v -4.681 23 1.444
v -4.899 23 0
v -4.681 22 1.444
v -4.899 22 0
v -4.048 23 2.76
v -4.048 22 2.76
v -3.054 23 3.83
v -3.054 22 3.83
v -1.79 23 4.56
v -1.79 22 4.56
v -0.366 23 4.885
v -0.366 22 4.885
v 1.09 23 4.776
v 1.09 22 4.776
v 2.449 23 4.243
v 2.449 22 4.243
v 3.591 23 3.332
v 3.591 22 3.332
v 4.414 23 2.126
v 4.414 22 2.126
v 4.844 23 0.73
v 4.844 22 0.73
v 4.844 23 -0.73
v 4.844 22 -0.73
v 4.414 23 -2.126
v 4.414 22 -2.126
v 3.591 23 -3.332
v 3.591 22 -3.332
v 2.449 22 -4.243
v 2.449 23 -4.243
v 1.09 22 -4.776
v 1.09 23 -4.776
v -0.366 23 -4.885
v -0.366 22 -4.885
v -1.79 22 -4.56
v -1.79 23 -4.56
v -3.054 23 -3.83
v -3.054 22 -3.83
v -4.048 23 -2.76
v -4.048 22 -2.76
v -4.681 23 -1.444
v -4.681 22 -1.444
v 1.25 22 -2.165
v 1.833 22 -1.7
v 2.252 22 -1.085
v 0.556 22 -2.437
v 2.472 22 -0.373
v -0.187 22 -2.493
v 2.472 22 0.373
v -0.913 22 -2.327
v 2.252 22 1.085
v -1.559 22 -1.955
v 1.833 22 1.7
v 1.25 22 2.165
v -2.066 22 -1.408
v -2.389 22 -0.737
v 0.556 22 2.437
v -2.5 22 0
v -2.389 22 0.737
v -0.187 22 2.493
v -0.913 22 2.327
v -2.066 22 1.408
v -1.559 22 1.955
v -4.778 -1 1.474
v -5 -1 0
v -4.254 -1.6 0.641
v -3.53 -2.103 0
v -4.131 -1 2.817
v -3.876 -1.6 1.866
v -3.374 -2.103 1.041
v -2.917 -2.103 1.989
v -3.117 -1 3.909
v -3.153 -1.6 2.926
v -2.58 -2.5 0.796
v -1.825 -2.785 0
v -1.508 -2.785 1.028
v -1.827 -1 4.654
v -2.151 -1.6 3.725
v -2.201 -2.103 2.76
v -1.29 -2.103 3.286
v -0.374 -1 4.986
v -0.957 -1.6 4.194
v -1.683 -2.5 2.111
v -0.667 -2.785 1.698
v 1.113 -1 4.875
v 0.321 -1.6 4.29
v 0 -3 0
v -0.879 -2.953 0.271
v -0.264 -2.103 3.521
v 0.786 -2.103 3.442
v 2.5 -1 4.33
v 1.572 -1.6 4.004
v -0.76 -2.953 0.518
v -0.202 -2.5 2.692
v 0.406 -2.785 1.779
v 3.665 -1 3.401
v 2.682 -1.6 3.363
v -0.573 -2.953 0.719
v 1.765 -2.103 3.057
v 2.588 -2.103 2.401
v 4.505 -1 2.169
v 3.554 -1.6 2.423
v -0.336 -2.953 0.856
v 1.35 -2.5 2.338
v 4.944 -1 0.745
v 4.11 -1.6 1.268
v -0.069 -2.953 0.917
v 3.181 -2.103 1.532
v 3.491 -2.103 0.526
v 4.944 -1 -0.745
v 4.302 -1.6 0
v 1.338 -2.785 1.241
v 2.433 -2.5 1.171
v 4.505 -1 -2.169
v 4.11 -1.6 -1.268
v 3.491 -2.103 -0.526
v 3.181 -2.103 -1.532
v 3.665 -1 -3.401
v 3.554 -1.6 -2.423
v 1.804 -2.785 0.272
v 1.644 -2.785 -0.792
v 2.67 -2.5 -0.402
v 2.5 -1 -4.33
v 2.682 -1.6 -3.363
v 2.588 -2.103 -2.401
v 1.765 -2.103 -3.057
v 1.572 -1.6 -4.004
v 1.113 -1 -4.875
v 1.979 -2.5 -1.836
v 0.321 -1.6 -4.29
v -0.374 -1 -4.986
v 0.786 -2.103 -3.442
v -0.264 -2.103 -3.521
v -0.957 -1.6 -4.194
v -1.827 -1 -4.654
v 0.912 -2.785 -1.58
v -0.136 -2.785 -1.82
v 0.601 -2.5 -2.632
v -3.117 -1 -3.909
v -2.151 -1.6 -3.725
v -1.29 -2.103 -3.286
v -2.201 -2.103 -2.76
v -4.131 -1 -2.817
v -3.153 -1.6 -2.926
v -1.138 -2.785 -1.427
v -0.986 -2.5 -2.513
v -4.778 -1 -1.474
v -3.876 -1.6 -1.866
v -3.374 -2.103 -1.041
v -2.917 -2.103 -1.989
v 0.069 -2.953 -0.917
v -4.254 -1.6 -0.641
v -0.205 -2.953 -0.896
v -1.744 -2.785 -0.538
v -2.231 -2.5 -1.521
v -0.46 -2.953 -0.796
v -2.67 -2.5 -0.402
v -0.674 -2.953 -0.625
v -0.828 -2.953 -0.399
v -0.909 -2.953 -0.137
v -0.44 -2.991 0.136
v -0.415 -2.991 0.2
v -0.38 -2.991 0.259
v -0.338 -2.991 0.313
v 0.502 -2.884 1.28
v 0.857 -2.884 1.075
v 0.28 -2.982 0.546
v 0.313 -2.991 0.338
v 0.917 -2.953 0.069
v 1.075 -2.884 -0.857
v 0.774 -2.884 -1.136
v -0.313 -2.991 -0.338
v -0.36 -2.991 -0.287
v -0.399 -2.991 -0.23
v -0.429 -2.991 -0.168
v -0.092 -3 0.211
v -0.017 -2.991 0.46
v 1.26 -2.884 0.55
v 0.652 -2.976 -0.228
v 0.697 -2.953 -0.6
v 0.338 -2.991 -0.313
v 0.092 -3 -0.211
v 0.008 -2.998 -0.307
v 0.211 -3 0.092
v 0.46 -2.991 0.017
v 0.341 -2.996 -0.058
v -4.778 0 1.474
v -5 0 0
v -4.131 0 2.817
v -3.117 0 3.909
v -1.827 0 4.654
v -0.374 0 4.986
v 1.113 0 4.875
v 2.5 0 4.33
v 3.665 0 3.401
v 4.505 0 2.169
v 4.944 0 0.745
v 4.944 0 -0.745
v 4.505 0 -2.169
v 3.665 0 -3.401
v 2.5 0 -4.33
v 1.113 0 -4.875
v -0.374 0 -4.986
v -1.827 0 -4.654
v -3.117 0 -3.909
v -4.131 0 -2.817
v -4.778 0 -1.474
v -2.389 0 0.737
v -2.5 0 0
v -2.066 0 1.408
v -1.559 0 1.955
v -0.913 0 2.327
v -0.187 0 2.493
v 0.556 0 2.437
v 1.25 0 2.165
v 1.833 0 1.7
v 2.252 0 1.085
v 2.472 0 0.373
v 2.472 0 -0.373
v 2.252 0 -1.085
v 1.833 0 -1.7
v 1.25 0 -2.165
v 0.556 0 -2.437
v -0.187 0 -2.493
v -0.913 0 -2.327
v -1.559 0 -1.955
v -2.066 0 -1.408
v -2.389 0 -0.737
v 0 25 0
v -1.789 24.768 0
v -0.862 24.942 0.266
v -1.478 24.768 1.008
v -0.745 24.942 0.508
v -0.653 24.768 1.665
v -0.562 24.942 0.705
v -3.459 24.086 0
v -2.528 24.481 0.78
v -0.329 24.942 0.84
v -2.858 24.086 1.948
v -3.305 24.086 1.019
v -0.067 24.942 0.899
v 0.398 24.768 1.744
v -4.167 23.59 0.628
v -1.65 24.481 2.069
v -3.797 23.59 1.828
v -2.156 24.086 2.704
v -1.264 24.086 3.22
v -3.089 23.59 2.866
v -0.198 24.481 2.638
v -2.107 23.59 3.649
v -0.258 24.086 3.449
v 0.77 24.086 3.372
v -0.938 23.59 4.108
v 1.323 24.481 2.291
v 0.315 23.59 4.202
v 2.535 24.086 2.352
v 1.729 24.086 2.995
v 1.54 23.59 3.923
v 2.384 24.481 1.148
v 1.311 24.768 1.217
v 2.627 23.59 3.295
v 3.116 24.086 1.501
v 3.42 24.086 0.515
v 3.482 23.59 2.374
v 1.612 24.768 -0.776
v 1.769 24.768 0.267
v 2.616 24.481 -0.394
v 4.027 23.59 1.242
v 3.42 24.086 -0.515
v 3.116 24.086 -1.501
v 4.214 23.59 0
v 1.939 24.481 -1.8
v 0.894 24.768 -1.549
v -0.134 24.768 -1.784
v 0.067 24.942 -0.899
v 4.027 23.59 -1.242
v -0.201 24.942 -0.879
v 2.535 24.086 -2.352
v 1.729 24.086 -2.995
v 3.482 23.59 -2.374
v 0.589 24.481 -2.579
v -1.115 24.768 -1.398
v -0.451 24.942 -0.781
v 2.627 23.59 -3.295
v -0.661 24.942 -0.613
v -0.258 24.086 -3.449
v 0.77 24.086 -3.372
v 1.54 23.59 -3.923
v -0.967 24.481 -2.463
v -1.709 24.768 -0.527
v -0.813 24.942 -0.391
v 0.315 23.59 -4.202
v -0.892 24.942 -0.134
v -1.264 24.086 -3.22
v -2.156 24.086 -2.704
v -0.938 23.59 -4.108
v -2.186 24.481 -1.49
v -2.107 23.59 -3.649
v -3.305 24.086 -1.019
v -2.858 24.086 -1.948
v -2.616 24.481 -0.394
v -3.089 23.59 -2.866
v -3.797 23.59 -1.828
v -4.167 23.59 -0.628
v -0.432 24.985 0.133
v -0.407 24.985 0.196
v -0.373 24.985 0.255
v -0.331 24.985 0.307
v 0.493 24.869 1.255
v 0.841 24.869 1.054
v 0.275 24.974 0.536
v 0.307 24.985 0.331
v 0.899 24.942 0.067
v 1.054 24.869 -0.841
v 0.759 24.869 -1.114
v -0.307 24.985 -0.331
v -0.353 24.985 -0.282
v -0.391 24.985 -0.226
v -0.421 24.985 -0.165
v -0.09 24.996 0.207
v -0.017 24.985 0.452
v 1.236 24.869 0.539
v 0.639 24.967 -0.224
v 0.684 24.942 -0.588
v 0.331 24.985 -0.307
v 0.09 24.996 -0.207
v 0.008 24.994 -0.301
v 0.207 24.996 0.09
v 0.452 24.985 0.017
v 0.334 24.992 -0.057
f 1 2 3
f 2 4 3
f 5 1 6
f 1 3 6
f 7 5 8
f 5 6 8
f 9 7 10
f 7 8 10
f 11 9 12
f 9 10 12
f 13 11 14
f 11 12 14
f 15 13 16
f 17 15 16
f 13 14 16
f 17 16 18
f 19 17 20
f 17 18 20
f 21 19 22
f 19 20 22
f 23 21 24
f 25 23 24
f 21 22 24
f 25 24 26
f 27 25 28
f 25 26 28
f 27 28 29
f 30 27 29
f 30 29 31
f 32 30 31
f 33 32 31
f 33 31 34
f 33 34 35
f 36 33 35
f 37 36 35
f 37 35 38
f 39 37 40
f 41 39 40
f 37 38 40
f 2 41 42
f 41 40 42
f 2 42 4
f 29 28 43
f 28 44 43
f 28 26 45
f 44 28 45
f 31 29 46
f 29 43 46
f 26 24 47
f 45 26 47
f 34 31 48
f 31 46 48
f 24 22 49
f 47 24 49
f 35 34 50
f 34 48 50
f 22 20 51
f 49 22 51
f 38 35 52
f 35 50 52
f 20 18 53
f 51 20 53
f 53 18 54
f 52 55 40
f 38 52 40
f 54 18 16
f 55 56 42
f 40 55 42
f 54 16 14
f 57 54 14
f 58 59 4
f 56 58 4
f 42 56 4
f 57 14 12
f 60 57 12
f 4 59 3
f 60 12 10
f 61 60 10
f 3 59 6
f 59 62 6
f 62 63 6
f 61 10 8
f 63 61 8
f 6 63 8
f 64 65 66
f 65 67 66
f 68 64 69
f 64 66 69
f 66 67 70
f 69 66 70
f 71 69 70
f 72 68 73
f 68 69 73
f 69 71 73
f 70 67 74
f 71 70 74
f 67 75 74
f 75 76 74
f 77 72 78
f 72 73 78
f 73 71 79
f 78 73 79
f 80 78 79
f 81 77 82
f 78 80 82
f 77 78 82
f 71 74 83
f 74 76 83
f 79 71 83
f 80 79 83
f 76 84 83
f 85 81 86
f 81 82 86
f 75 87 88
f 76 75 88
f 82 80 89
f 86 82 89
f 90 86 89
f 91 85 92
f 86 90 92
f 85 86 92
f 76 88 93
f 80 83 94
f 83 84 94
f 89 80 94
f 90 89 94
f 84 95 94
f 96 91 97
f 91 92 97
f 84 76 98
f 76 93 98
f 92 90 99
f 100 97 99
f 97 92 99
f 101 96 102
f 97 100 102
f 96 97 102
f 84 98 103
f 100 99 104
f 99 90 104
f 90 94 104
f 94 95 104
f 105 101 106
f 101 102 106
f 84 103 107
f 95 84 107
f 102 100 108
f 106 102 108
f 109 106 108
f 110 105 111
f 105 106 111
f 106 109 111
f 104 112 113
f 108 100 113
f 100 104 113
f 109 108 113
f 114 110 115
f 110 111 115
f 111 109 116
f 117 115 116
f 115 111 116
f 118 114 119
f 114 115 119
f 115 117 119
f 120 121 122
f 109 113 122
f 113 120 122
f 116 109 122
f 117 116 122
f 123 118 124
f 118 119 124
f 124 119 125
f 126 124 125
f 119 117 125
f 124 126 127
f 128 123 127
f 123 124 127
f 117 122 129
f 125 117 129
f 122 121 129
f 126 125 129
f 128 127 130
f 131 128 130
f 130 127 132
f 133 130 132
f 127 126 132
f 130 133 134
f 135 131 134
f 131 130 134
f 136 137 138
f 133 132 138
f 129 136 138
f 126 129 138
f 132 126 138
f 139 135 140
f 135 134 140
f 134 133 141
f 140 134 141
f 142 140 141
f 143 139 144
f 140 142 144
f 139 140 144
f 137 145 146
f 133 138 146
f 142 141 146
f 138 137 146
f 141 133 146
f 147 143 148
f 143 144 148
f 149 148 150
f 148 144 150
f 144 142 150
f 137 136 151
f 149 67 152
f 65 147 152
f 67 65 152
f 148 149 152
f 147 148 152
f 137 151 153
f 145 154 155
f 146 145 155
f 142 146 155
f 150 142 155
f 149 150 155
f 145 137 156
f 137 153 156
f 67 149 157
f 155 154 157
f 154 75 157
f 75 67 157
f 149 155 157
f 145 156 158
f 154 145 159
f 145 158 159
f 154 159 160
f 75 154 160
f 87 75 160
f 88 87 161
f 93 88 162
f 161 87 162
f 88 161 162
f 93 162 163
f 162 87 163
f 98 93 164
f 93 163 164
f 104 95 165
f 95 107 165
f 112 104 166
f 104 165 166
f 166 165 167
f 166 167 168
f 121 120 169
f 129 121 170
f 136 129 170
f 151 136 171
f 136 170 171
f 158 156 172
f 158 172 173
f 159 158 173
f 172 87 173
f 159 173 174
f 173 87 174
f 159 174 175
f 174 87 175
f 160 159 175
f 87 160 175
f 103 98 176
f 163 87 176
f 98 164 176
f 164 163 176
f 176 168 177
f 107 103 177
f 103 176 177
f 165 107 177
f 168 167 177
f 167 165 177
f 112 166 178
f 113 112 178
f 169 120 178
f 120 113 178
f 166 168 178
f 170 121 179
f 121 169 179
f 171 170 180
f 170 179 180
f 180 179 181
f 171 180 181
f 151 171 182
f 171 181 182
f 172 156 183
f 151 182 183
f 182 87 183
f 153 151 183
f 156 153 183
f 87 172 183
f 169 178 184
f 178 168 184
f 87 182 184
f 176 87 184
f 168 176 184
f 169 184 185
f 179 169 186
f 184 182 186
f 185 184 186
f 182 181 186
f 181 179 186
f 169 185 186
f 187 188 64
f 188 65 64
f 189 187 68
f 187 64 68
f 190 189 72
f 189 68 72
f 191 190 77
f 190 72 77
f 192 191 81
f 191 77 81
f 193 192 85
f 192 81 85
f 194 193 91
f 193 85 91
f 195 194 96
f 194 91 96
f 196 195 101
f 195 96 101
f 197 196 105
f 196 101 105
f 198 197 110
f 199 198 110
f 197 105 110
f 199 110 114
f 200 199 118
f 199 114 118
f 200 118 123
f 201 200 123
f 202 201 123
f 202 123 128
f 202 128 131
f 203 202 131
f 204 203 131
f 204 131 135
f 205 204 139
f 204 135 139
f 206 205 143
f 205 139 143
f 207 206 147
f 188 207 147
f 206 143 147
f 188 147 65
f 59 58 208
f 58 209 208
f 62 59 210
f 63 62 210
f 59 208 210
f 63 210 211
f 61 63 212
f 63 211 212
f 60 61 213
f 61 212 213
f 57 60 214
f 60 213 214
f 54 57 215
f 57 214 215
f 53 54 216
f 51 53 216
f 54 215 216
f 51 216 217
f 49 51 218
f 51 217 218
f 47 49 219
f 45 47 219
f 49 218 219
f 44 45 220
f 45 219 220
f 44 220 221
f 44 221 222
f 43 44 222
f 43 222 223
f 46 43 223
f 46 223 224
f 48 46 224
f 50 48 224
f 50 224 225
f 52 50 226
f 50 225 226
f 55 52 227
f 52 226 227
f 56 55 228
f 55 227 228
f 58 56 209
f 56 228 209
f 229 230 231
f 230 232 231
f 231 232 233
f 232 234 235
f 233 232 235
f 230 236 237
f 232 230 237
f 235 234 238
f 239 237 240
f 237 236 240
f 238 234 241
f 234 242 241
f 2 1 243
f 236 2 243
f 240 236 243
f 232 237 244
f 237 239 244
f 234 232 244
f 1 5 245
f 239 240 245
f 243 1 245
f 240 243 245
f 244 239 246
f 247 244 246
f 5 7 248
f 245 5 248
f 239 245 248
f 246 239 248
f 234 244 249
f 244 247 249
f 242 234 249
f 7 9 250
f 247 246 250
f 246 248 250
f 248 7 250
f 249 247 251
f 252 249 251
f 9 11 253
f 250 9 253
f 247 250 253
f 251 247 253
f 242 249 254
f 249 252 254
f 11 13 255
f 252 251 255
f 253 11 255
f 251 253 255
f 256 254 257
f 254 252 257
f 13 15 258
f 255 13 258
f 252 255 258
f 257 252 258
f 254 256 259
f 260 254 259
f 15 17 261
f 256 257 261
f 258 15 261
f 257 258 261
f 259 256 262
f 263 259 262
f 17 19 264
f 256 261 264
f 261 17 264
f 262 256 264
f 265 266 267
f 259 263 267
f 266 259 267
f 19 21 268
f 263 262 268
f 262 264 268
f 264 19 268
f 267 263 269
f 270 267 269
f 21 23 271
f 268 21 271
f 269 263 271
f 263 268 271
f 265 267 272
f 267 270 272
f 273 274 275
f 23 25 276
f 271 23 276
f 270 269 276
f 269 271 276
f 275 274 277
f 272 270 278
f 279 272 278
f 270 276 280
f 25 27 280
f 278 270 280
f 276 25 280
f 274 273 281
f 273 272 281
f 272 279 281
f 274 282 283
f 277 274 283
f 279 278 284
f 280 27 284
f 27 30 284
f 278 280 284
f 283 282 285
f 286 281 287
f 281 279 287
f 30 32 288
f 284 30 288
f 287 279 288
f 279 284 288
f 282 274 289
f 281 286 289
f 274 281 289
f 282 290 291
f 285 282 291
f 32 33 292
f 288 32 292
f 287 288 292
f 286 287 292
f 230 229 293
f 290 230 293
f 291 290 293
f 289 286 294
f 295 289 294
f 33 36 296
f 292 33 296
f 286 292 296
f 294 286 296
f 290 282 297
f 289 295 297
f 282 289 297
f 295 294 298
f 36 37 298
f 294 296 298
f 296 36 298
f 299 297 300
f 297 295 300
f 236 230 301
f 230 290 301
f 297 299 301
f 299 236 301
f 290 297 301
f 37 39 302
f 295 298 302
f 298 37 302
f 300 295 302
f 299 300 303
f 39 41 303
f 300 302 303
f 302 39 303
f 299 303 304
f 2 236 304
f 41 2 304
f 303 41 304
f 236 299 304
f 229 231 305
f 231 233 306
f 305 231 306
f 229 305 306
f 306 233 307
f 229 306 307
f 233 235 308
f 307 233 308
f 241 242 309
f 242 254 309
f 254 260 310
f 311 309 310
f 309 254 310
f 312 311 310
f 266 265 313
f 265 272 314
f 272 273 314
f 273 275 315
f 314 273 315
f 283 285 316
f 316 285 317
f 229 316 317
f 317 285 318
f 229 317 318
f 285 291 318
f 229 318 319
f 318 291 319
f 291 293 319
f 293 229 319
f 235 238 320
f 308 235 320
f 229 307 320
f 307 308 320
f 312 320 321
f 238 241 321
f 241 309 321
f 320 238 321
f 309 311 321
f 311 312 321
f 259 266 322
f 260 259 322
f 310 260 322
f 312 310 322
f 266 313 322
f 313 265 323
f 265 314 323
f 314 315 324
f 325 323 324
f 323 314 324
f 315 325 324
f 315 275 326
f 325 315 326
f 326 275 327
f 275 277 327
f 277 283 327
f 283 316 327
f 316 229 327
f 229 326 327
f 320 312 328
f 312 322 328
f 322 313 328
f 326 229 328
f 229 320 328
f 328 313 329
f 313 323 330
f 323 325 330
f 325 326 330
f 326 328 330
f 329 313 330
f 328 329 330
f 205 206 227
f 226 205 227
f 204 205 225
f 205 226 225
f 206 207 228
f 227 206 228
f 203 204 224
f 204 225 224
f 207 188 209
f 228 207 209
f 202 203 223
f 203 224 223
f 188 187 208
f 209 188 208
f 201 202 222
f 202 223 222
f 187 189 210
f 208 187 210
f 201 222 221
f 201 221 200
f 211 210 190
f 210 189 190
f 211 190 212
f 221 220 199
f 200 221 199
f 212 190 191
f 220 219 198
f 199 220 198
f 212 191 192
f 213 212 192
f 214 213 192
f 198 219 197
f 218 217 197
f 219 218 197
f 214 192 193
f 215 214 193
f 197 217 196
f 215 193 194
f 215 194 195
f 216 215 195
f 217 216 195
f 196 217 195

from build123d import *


with BuildPart() as f1:
    # F0 (on Top) → F1 (revolve)
    with BuildSketch(Plane.XY):
        with BuildLine():
            Line((-4.898979, 22), (-2.5, 22))
            Line((-2.5, 22), (-2.5, 0))
            Line((-2.5, 0), (-5, 0))
            Line((-5, 0), (-5, -1))
            ThreePointArc((-5, -1), (-2.7, -2.5), (0, -3))
            Line((0, -3), (0, 25))
            ThreePointArc((0, 25), (-2.645751, 24.480741), (-4.898979, 23))
            Line((-4.898979, 23), (-4.898979, 22))
        make_face()
    revolve(axis=Axis((0, 11, 0), (0, 1, 0)))


solid = f1.part
